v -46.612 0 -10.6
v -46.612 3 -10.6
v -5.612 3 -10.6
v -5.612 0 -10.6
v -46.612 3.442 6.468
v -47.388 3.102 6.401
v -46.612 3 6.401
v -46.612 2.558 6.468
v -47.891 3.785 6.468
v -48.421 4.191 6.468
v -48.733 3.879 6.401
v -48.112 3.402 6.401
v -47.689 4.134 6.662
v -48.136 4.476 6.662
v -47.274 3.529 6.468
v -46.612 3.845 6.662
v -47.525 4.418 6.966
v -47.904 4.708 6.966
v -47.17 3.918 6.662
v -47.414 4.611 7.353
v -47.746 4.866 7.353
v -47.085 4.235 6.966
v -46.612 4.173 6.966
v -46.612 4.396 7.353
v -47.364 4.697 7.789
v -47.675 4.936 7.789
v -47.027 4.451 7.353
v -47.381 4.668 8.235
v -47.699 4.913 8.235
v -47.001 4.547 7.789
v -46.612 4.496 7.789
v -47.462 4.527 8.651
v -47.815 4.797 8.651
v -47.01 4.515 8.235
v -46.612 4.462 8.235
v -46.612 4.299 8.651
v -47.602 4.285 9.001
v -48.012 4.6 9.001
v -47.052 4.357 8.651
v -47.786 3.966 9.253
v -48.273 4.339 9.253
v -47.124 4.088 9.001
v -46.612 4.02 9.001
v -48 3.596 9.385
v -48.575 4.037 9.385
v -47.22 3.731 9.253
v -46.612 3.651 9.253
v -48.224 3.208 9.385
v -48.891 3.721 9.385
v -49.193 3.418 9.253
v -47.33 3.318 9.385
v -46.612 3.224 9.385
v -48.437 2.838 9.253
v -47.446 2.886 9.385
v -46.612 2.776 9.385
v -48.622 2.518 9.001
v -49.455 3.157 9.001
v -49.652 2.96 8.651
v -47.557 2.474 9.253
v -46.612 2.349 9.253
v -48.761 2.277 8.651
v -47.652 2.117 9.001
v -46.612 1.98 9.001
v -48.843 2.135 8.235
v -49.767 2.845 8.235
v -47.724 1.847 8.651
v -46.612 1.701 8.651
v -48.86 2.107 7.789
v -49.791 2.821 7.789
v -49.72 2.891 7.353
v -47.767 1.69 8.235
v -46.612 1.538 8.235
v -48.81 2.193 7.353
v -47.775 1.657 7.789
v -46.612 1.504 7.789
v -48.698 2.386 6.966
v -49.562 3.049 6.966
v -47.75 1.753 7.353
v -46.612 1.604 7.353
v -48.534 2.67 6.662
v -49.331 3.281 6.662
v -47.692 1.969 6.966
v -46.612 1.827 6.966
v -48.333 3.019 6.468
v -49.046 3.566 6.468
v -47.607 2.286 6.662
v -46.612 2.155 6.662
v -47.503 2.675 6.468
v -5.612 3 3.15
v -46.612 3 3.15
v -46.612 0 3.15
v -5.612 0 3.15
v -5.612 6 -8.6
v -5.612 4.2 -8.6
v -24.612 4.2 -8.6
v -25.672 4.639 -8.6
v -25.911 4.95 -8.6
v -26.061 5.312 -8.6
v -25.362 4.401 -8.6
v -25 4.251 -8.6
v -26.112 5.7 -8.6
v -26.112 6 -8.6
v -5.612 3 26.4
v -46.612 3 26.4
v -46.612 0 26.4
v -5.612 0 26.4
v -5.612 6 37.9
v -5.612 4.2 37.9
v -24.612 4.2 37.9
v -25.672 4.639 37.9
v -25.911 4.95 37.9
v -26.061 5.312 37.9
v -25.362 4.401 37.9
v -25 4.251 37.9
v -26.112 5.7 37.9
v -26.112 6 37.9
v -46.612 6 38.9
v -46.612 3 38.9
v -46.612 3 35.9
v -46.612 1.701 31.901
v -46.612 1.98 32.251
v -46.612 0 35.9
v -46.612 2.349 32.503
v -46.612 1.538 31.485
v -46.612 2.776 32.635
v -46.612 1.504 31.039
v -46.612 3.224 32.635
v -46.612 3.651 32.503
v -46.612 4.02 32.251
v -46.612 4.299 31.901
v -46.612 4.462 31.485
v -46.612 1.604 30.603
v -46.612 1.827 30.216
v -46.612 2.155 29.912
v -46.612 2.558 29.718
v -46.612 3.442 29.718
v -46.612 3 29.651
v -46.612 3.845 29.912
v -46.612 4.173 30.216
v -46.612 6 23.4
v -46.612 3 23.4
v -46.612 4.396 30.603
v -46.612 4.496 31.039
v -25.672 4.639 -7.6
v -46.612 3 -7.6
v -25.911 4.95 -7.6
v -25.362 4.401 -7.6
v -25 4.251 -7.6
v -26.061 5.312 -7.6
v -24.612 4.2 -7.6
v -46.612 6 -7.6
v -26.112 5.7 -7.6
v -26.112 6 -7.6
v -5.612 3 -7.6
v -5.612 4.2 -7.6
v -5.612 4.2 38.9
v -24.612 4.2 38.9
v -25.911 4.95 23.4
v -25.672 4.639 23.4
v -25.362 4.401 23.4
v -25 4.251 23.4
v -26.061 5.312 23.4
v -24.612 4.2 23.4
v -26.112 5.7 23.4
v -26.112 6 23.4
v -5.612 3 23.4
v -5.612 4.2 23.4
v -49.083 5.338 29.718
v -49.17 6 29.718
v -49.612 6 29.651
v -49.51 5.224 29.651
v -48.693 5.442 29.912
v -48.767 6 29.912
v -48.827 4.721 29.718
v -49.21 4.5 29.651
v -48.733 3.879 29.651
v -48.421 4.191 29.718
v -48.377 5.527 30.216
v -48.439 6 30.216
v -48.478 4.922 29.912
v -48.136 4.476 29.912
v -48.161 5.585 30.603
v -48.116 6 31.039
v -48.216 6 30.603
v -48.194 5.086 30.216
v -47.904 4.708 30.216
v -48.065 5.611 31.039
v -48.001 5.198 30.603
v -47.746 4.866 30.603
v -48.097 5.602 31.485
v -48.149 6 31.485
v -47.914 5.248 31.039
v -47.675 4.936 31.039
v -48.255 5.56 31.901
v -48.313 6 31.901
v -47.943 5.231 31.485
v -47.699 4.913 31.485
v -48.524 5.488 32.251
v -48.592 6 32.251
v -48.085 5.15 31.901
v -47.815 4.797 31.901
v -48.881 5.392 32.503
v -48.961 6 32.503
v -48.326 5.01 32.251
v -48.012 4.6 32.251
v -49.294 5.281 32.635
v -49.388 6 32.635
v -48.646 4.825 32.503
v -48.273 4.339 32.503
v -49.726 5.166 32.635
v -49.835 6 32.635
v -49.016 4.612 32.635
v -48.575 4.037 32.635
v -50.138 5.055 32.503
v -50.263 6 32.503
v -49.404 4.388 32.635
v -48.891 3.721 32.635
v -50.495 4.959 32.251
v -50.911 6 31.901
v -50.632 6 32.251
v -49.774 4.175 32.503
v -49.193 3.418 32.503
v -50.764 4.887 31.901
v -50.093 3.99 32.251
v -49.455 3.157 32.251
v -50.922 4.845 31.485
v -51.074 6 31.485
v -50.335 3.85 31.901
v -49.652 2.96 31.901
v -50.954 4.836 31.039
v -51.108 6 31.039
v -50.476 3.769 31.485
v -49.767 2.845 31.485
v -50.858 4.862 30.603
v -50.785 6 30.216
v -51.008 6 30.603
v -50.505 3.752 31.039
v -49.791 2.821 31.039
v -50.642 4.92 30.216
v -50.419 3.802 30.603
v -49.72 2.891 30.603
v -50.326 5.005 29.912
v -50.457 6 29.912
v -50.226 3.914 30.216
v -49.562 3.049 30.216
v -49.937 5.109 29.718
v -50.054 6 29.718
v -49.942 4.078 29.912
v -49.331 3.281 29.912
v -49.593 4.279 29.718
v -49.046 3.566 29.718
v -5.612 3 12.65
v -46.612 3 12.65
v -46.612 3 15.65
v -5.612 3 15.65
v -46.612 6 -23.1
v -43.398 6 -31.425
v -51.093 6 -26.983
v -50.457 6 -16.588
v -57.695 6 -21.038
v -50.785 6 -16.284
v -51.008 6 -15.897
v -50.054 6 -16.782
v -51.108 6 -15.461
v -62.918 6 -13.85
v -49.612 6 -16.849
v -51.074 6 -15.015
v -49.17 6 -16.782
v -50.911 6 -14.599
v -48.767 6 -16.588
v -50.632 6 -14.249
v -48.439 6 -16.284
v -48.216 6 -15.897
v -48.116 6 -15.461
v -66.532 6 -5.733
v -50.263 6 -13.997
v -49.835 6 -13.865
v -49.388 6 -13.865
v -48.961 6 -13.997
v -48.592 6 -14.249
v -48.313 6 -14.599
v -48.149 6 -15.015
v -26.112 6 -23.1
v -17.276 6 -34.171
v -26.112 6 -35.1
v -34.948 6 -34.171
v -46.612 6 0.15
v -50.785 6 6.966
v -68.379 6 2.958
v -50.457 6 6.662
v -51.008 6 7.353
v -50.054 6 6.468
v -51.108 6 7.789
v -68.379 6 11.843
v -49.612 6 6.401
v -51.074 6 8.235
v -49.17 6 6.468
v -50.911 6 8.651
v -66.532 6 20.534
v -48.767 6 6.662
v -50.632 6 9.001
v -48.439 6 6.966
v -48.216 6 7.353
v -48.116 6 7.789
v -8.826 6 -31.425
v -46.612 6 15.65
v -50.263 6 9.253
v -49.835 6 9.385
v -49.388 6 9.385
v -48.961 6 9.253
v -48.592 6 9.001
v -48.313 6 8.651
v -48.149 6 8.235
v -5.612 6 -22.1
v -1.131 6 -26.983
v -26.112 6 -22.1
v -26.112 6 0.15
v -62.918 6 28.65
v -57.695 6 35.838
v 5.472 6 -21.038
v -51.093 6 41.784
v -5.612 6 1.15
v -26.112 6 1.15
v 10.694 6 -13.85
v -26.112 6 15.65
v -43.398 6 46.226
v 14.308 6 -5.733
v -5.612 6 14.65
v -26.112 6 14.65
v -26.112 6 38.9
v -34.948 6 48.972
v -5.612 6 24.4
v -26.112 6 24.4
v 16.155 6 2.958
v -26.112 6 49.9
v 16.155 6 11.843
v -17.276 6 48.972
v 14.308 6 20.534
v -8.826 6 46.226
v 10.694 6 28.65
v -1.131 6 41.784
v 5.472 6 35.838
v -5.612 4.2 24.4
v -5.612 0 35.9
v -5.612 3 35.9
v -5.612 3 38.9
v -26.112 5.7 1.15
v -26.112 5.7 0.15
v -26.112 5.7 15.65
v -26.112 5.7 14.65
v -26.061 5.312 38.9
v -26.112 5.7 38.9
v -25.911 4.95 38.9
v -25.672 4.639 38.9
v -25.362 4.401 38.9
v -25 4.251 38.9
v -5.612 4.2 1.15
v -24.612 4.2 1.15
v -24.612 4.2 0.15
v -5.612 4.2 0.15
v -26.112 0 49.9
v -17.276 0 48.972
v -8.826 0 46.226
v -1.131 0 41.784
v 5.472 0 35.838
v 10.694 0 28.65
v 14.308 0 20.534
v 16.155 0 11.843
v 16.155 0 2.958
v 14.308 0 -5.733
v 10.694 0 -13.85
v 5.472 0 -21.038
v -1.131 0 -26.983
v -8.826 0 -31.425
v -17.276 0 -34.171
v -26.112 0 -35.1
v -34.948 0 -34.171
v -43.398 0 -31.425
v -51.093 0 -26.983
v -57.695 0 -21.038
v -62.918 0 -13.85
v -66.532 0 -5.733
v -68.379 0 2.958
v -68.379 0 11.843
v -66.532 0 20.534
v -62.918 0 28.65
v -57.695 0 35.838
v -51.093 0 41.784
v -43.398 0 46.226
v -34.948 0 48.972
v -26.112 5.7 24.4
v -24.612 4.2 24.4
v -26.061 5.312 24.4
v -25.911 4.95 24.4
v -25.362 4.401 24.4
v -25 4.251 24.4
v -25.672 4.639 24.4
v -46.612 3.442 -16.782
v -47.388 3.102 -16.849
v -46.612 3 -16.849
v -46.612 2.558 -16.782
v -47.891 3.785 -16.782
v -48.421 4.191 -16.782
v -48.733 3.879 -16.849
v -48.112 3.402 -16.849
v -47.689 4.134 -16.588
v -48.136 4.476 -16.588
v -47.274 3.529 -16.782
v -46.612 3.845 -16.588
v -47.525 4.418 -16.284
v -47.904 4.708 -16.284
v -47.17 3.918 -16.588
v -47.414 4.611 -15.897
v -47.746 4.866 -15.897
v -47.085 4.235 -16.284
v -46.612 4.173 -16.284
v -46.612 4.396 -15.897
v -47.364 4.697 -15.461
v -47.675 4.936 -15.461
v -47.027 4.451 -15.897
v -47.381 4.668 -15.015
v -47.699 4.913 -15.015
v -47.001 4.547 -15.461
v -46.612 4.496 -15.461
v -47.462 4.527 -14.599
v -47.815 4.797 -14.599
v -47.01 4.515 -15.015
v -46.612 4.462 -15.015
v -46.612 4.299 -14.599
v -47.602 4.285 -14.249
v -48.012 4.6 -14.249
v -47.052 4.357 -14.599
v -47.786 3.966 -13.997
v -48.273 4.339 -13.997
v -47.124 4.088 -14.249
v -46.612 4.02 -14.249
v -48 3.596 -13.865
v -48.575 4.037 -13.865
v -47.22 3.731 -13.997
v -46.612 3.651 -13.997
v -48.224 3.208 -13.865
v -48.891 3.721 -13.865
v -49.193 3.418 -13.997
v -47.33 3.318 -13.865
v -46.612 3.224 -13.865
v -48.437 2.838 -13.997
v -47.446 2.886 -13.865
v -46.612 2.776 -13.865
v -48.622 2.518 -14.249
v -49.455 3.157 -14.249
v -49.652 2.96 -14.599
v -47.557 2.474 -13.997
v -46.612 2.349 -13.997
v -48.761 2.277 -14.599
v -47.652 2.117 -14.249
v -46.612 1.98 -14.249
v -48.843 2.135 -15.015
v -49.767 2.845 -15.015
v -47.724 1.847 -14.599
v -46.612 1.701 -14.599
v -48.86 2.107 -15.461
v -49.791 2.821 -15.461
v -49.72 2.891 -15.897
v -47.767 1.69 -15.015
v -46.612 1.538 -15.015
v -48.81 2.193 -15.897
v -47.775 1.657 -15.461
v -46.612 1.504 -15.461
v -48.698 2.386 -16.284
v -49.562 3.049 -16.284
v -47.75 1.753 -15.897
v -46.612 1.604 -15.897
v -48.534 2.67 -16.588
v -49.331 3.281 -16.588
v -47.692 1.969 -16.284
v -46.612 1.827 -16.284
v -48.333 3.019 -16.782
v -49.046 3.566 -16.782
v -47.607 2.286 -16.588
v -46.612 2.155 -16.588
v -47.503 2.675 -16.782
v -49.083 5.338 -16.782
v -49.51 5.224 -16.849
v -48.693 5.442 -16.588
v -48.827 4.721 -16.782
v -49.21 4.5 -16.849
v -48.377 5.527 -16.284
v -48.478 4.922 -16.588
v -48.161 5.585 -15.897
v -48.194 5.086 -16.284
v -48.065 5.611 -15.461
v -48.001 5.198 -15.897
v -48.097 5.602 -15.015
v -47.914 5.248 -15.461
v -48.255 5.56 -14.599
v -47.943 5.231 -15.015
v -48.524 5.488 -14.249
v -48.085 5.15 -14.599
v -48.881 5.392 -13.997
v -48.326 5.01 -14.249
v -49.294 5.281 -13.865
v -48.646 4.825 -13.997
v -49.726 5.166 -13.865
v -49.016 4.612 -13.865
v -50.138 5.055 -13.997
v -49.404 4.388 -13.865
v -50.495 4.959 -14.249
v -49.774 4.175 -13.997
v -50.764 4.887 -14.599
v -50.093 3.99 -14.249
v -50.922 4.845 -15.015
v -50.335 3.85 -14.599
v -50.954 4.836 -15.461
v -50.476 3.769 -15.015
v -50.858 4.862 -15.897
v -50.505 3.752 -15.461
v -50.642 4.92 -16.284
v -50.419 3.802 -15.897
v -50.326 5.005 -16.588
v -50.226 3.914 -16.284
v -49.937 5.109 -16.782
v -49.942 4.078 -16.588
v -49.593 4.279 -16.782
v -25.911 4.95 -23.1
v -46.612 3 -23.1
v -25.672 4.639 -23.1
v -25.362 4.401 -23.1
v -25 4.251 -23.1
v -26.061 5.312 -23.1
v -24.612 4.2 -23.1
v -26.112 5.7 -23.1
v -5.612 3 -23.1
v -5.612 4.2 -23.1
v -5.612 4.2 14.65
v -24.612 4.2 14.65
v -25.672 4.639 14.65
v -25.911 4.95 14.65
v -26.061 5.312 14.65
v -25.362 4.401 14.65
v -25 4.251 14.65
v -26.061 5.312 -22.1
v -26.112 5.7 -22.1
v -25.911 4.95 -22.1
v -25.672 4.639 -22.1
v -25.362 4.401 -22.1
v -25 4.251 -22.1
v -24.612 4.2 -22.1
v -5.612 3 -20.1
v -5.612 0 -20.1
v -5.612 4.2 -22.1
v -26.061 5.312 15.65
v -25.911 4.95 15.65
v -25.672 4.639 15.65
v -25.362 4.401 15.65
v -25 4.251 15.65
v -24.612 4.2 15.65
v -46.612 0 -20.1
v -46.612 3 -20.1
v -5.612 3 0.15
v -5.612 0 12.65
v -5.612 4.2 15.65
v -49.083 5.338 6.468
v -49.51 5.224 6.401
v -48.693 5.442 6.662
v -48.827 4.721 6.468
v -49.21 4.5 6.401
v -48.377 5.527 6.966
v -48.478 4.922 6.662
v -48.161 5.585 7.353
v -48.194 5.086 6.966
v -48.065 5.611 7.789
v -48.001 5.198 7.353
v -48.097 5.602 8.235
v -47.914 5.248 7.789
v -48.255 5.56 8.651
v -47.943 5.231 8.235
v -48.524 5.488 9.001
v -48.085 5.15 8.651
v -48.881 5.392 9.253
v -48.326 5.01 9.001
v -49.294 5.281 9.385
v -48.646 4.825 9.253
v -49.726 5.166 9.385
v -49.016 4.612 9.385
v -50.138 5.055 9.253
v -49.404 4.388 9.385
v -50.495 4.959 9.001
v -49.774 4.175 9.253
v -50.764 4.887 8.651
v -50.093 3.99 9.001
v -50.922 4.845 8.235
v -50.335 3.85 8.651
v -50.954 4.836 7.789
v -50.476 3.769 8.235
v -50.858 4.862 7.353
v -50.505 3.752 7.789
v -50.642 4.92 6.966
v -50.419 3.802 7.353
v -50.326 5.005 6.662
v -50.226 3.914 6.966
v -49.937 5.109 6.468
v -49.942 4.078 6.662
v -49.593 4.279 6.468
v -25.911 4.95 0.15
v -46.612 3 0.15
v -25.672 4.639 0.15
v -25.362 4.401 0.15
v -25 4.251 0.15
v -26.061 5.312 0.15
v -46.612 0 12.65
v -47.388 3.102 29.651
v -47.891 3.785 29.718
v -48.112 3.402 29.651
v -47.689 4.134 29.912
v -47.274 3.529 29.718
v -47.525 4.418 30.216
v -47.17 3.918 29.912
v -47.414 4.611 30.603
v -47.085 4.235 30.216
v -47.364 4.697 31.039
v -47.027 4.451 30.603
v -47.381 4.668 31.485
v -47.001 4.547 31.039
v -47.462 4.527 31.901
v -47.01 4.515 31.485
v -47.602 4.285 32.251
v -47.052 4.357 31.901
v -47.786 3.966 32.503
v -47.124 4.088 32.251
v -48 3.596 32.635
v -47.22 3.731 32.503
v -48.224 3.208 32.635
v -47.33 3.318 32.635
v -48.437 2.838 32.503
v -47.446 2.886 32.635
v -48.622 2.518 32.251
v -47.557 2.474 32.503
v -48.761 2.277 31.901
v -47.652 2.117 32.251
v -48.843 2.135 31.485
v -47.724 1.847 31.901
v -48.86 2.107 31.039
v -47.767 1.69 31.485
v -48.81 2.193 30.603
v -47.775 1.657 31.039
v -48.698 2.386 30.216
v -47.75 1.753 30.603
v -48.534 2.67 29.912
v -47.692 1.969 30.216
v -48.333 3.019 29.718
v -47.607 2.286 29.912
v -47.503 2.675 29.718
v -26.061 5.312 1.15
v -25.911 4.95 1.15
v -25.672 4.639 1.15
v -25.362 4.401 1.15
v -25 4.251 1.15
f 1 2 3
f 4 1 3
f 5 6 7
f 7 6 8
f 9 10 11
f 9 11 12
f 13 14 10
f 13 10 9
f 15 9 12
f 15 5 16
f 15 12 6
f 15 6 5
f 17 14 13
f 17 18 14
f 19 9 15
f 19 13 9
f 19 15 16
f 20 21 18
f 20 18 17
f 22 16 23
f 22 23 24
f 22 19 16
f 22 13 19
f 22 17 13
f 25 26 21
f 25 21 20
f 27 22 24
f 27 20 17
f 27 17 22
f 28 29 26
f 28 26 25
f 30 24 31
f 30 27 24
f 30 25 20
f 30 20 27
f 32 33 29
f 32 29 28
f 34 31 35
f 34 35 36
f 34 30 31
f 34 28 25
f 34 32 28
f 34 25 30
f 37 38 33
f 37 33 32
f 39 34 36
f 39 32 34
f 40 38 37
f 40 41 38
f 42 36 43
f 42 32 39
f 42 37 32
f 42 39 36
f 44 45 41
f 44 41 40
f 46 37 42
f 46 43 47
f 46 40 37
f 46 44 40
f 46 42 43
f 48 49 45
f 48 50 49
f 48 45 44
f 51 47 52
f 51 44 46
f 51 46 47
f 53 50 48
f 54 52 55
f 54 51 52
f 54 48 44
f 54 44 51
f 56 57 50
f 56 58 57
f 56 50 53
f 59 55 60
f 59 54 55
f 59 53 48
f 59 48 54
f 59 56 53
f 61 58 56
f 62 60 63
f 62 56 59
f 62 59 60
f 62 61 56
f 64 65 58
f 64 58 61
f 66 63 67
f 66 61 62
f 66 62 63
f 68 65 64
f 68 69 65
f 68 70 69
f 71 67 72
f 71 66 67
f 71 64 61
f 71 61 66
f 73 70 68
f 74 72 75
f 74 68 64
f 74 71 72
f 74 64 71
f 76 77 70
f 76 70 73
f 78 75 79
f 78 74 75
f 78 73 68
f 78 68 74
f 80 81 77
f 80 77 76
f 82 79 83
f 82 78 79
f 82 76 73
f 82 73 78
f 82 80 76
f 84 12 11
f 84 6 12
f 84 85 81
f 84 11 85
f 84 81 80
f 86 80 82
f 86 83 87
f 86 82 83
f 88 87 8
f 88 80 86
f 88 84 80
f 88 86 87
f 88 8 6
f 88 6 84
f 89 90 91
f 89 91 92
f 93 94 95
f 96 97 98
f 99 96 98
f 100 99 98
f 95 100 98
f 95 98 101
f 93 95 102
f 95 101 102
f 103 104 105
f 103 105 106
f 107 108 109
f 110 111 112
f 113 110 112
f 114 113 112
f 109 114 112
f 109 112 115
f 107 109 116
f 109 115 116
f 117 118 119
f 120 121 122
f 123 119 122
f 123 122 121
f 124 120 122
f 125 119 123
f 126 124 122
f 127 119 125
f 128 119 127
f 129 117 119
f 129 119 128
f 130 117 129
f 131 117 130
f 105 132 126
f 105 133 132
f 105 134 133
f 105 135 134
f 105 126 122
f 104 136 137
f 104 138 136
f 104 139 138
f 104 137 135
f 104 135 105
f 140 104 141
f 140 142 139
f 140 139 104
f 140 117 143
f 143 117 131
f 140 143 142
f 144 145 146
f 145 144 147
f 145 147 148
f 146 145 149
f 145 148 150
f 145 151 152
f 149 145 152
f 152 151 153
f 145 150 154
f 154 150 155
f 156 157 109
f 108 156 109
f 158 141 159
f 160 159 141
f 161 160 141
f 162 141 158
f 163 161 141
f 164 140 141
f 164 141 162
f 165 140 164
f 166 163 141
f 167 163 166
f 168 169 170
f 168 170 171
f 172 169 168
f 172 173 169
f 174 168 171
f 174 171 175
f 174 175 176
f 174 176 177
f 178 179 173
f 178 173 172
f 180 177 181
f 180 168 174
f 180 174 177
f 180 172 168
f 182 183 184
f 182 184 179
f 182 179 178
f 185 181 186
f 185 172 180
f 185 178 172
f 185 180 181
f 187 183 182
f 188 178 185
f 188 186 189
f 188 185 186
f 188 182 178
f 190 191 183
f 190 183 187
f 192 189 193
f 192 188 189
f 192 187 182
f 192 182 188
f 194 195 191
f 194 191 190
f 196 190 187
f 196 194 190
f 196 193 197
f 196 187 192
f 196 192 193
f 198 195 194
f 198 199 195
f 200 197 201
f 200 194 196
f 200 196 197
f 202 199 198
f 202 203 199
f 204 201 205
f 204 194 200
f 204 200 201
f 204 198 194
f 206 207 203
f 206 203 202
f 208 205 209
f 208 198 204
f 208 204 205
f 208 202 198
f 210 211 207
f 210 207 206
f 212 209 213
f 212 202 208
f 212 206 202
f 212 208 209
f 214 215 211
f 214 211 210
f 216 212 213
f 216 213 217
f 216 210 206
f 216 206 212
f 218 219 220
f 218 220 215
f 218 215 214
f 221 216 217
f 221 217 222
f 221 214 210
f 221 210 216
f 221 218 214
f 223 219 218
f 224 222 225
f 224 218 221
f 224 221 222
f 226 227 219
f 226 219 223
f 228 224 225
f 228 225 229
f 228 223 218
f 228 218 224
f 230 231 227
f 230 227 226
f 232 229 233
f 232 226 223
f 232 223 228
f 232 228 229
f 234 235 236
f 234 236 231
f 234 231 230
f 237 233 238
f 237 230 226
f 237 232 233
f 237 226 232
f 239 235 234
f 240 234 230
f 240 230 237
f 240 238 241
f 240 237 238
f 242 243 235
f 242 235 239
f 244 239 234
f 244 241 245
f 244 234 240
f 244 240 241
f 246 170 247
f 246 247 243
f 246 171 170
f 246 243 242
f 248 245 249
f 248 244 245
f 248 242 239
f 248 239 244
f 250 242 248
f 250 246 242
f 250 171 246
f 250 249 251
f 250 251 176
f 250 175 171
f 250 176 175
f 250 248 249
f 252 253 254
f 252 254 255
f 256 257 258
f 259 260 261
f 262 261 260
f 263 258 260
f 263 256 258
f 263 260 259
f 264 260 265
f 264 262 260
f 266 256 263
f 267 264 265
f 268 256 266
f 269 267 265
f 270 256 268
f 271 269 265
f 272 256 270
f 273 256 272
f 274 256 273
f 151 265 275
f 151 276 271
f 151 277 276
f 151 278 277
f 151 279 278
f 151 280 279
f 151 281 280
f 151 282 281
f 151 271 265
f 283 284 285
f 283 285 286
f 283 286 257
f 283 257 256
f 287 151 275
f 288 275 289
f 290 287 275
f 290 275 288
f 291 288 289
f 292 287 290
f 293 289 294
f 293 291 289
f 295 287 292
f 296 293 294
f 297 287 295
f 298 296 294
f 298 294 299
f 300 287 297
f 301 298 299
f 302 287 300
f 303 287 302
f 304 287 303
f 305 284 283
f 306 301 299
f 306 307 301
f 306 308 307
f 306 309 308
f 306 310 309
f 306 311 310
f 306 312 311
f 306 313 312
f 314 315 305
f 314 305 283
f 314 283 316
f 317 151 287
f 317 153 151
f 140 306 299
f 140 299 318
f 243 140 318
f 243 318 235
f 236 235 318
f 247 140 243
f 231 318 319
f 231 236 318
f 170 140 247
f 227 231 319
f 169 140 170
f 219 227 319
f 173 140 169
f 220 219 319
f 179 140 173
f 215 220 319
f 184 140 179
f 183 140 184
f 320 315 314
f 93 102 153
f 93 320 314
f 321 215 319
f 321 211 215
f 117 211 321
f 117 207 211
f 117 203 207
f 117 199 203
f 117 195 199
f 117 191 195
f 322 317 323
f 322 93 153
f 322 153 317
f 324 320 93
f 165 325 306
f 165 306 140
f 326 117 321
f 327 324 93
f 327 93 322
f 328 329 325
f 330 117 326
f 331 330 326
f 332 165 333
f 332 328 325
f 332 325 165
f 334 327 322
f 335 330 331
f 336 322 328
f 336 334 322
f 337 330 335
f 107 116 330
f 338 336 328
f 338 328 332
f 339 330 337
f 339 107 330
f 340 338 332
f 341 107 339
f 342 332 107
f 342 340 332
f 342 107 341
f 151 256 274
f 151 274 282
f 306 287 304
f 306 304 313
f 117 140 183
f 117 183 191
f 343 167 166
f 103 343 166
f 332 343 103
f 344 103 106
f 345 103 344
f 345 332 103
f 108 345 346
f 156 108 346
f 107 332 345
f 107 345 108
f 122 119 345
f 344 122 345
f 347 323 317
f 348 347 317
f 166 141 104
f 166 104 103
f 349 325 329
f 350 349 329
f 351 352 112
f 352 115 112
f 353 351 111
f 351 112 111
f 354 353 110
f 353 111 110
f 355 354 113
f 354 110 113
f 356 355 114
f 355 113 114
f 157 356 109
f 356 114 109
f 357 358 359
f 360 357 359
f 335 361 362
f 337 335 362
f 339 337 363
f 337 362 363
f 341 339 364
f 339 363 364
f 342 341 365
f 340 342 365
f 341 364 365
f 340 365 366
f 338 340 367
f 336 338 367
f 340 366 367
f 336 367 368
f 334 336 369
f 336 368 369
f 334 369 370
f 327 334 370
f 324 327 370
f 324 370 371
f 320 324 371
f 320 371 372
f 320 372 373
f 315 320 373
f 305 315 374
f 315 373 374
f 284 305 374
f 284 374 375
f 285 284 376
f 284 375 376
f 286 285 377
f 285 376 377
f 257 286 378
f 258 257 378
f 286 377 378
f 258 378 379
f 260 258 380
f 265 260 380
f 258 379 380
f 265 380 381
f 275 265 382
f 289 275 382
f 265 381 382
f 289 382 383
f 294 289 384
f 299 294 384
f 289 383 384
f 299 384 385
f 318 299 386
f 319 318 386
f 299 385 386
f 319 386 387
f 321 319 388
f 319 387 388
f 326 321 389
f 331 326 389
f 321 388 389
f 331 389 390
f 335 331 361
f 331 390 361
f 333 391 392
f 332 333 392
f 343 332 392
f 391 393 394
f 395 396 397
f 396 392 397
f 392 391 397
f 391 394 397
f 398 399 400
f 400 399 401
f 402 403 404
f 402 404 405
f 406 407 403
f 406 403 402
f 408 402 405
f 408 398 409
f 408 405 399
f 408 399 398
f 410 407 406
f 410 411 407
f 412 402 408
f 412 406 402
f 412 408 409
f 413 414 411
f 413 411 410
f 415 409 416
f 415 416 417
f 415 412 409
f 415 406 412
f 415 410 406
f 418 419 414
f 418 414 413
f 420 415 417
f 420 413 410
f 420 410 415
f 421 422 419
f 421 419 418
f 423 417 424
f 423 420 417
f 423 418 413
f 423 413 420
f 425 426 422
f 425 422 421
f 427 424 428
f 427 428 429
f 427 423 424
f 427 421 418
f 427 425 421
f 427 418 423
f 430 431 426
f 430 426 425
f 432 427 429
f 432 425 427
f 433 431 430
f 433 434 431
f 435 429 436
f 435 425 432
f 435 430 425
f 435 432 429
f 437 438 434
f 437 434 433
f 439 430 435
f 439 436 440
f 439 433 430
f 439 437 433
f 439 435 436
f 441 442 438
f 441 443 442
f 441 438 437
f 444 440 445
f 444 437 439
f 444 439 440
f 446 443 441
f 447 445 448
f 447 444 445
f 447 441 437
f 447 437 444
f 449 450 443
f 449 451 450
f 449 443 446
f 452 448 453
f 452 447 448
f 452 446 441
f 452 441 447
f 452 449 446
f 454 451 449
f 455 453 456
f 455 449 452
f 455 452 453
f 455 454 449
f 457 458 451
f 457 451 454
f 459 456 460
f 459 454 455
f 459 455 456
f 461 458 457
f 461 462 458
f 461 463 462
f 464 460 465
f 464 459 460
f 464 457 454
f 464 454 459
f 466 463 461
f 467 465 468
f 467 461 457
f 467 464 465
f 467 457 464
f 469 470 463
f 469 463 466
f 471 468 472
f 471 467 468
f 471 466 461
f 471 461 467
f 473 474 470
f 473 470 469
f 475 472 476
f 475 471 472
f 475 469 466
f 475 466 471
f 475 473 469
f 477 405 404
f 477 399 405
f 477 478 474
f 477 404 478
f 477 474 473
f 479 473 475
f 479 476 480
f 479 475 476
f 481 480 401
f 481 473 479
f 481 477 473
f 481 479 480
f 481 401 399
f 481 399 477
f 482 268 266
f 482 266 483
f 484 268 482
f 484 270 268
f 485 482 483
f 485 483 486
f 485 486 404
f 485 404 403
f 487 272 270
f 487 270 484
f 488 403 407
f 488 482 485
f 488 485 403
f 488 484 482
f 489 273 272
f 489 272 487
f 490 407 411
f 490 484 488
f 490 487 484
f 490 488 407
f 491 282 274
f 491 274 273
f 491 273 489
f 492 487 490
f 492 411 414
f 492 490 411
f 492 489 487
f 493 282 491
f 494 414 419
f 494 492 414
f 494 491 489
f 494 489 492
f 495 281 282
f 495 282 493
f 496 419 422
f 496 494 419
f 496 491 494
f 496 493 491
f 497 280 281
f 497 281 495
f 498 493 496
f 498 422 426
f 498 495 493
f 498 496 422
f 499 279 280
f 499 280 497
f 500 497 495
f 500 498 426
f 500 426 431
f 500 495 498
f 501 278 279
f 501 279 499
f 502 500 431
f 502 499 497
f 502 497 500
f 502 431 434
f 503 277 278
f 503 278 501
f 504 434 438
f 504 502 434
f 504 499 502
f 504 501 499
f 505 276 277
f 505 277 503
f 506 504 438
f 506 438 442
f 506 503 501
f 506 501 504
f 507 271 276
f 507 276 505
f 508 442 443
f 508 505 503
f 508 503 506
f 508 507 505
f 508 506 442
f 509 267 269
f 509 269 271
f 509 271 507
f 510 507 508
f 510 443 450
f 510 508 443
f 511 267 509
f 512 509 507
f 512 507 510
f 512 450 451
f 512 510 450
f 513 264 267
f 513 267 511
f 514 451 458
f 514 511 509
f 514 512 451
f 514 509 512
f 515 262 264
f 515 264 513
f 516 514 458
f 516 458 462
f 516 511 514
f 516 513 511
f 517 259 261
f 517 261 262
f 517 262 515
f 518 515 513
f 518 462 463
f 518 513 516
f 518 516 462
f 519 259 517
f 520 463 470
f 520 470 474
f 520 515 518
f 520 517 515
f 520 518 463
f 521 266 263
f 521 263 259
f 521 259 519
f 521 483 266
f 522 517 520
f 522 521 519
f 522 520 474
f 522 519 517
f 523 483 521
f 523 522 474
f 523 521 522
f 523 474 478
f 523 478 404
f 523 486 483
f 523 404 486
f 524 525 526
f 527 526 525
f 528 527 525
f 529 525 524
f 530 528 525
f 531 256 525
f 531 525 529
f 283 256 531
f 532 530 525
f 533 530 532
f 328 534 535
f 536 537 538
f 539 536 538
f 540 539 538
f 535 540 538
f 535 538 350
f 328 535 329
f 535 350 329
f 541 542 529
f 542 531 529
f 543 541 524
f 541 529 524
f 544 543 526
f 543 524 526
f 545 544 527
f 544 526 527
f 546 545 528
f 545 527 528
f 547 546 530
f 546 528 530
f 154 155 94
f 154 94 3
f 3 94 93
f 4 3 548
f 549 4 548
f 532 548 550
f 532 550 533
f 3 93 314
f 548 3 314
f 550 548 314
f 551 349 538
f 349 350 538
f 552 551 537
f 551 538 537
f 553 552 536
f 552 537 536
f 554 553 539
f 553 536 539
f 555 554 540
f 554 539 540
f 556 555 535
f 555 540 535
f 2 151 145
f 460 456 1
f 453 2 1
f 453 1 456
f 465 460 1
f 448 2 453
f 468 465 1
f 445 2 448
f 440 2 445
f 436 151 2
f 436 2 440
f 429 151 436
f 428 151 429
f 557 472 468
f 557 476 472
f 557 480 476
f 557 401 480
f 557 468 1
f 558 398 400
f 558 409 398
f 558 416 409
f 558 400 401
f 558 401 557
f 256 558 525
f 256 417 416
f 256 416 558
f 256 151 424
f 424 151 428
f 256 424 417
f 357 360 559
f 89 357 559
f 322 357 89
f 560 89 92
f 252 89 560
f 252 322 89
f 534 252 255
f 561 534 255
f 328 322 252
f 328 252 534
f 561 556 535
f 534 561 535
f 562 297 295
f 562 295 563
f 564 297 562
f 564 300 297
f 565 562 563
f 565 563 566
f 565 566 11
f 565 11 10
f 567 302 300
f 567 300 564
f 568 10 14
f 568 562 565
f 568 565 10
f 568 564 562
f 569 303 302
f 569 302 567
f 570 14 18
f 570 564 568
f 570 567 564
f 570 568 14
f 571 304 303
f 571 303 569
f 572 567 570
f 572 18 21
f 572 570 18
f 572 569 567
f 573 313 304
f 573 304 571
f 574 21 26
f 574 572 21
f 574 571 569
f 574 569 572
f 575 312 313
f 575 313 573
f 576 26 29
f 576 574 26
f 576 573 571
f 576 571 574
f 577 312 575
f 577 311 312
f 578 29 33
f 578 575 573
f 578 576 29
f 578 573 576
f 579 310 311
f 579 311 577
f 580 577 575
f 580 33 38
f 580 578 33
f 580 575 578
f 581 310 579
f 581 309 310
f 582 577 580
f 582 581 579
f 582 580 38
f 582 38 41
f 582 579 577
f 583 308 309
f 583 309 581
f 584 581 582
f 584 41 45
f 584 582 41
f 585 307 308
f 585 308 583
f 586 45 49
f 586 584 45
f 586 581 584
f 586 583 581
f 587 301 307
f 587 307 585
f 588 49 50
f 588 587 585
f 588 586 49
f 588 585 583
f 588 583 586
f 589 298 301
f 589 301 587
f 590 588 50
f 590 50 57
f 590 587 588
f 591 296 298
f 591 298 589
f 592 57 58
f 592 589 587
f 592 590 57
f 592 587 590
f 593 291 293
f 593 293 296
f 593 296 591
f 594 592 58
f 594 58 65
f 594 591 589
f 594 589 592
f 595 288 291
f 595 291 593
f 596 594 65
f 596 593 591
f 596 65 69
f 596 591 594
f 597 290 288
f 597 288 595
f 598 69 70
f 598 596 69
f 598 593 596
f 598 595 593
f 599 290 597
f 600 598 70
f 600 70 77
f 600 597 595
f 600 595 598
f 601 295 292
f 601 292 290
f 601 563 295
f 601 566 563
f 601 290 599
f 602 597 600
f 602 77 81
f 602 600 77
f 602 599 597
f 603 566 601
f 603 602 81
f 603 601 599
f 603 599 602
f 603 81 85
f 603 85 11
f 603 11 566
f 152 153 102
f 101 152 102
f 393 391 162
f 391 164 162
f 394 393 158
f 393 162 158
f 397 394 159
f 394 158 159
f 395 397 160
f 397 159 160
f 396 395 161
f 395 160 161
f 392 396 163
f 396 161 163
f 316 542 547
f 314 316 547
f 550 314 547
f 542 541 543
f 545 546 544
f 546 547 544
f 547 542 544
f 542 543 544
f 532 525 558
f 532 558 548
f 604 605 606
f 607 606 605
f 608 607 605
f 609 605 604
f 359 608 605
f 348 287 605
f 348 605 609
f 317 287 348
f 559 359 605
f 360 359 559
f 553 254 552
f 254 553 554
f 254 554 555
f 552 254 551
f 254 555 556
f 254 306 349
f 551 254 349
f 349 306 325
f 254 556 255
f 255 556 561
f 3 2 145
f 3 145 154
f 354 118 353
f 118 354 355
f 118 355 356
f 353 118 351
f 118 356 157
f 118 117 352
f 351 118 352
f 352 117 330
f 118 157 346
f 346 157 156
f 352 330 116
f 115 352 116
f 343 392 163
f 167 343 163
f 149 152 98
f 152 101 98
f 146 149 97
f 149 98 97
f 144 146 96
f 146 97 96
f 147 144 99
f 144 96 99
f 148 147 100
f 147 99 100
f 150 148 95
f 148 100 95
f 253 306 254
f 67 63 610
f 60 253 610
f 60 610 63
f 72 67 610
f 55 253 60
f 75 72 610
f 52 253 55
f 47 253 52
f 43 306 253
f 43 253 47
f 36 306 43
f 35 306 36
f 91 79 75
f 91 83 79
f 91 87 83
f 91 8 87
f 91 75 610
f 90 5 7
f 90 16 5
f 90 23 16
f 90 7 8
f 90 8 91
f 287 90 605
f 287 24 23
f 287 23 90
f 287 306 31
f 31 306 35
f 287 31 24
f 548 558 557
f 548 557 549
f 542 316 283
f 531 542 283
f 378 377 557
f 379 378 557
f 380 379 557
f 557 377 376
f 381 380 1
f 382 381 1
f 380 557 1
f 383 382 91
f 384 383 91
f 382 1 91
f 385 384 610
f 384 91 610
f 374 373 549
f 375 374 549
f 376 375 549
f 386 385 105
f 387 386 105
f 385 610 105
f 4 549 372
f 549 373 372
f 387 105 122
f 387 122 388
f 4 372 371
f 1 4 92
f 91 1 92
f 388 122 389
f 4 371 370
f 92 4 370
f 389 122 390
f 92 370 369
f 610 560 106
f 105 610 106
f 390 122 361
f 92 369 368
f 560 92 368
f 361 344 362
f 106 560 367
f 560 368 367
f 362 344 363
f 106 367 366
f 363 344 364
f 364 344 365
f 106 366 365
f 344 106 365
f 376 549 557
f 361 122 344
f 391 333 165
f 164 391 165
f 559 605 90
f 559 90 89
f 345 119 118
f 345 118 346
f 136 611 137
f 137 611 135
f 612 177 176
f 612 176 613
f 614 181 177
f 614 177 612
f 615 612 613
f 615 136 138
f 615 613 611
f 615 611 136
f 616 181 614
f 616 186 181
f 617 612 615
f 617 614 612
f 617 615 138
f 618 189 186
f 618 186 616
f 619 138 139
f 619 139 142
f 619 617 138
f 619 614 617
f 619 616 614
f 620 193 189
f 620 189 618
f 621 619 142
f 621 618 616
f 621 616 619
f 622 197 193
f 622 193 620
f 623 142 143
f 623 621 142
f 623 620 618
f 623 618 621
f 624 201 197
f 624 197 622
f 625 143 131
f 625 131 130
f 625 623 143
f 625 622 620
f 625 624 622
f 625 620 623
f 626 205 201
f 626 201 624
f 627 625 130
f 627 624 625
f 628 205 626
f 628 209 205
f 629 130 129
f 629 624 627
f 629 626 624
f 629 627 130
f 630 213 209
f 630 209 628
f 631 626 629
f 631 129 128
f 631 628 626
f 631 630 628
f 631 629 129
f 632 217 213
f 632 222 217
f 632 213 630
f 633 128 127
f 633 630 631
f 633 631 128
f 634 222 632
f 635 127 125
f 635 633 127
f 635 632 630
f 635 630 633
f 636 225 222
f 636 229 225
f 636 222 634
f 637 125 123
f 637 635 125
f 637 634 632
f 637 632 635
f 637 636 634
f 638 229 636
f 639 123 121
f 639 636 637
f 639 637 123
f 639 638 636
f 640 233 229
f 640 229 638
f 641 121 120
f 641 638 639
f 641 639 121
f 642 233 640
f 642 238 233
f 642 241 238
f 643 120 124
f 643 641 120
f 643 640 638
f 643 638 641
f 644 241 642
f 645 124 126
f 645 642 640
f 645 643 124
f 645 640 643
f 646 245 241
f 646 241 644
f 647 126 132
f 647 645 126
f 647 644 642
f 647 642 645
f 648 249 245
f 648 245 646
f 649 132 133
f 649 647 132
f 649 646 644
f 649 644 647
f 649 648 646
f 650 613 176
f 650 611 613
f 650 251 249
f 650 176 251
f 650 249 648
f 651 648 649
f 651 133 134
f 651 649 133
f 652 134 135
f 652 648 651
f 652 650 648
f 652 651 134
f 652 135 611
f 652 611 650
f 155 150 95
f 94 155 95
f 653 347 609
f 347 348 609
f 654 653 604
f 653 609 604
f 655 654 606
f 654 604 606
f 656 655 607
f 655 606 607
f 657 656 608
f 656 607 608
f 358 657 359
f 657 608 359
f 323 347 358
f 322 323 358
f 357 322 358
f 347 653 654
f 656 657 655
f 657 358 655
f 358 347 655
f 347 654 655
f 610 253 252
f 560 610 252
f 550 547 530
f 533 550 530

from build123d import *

# Parameters (mm, degrees)
SKETCH1_R              = 42.5
BOSS_EXTRUDE1_DEPTH    = 6
SKETCH2_W              = 20.5
SKETCH2_H              = 15.5
CUT_EXTRUDE1_DEPTH     = 3
CUT_EXTRUDE2_DEPTH     = 20.5
CUT_EXTRUDE3_REACH     = 86.892
SKETCH4_W              = 41
SKETCH4_H              = 9.5
SKETCH5_R              = 1.5
FILLET1_R              = 1.5
LPATTERN4_COUNT        = 3
LPATTERN4_PITCH        = 23.25
FILLET1_OF_LPATTERN4_R = 1.5


with BuildPart() as part:
    # Sketch1 → Boss-Extrude1 (new body)
    with BuildSketch(Plane(origin=(0, 0, 0), x_dir=(1, 0, 0), z_dir=(0, 1, 0))):
        with Locations(Location((-26.111816808, -7.400353612, 0), (0, 0, 270))):
            Circle(SKETCH1_R)
    extrude(amount=BOSS_EXTRUDE1_DEPTH)

    # Sketch2 → Cut-Extrude1 (cut)
    with BuildSketch(Plane(origin=(0, 6, 0), x_dir=(1, 0, 0), z_dir=(0, 1, 0))):
        with Locations((-36.361816808, 15.349646388)):
            Rectangle(SKETCH2_W, SKETCH2_H)
    cut_extrude1 = extrude(amount=-CUT_EXTRUDE1_DEPTH, mode=Mode.SUBTRACT)

    # Sketch3 → Cut-Extrude2 (cut)
    with BuildSketch(Plane.ZY.offset(26.111816808)):
        Polygon((-23.099646388, 3), (-7.599646388, 3), (-7.599646388, 4.2), (-8.599646388, 4.2), (-8.599646388, 6), (-22.099646388, 6), (-22.099646388, 4.2), (-23.099646388, 4.2), align=None)
    cut_extrude2 = extrude(amount=-CUT_EXTRUDE2_DEPTH, mode=Mode.SUBTRACT)

    # Sketch4 → Cut-Extrude3 (cut, up to next)
    with BuildSketch(Plane(origin=(0, 3, 0), x_dir=(1, 0, 0), z_dir=(0, 1, 0)), mode=Mode.PRIVATE) as cut_extrude3_sk1:
        with Locations((-26.111816808, 15.349646388)):
            Rectangle(SKETCH4_W, SKETCH4_H)
    cut_extrude3_tool1 = extrude(cut_extrude3_sk1.sketch, amount=-CUT_EXTRUDE3_REACH, mode=Mode.PRIVATE) & part.part
    cut_extrude3 = cut_extrude3_tool1.solids().sort_by_distance((-26.111817, 3, -15.349646))[0]
    add(cut_extrude3, mode=Mode.SUBTRACT)

    # Sketch5 → Cut-Revolve1 (revolve, cut)
    with BuildSketch(Plane(origin=(-46.611816808, 0, 0), x_dir=(0, 0, -1), z_dir=(1, 0, 0)), mode=Mode.PRIVATE) as cut_revolve1_sk:
        with Locations((15.348547186, 3)):
            Circle(SKETCH5_R)
    cut_revolve1 = revolve(cut_revolve1_sk.sketch.rotate(Axis((-46.611816808, 6, -23.099646388), (0, 0, 1)), 315), axis=Axis((-46.611816808, 6, -23.099646388), (0, 0, 1)), mode=Mode.SUBTRACT)

    # Fillet1
    fillet1_edges = [part.edges().sort_by_distance(p)[0] for p in [
        (-26.111816808, 4.2, -8.099646388),
        (-26.111816808, 4.2, -22.599646388),
    ]]
    fillet(fillet1_edges, radius=FILLET1_R)

    # LPattern4: Cut-Extrude1, Cut-Extrude2, Cut-Extrude3, Cut-Revolve1 ×3
    with Locations(*[(0, 0, i * LPATTERN4_PITCH) for i in range(1, LPATTERN4_COUNT)]):
        add(cut_extrude1, mode=Mode.SUBTRACT)
        add(cut_extrude2, mode=Mode.SUBTRACT)
        add(cut_extrude3, mode=Mode.SUBTRACT)
        add(cut_revolve1, mode=Mode.SUBTRACT)

    # Fillet1 of LPattern4
    fillet1_of_lpattern4_edges = [part.edges().sort_by_distance(p)[0] for p in [
        (-26.111816808, 4.2, 15.150353612),
        (-26.111816808, 4.2, 0.650353612),
        (-26.111816808, 4.2, 38.400353612),
        (-26.111816808, 4.2, 23.900353612),
    ]]
    fillet(fillet1_of_lpattern4_edges, radius=FILLET1_OF_LPATTERN4_R)


solid = part.part
